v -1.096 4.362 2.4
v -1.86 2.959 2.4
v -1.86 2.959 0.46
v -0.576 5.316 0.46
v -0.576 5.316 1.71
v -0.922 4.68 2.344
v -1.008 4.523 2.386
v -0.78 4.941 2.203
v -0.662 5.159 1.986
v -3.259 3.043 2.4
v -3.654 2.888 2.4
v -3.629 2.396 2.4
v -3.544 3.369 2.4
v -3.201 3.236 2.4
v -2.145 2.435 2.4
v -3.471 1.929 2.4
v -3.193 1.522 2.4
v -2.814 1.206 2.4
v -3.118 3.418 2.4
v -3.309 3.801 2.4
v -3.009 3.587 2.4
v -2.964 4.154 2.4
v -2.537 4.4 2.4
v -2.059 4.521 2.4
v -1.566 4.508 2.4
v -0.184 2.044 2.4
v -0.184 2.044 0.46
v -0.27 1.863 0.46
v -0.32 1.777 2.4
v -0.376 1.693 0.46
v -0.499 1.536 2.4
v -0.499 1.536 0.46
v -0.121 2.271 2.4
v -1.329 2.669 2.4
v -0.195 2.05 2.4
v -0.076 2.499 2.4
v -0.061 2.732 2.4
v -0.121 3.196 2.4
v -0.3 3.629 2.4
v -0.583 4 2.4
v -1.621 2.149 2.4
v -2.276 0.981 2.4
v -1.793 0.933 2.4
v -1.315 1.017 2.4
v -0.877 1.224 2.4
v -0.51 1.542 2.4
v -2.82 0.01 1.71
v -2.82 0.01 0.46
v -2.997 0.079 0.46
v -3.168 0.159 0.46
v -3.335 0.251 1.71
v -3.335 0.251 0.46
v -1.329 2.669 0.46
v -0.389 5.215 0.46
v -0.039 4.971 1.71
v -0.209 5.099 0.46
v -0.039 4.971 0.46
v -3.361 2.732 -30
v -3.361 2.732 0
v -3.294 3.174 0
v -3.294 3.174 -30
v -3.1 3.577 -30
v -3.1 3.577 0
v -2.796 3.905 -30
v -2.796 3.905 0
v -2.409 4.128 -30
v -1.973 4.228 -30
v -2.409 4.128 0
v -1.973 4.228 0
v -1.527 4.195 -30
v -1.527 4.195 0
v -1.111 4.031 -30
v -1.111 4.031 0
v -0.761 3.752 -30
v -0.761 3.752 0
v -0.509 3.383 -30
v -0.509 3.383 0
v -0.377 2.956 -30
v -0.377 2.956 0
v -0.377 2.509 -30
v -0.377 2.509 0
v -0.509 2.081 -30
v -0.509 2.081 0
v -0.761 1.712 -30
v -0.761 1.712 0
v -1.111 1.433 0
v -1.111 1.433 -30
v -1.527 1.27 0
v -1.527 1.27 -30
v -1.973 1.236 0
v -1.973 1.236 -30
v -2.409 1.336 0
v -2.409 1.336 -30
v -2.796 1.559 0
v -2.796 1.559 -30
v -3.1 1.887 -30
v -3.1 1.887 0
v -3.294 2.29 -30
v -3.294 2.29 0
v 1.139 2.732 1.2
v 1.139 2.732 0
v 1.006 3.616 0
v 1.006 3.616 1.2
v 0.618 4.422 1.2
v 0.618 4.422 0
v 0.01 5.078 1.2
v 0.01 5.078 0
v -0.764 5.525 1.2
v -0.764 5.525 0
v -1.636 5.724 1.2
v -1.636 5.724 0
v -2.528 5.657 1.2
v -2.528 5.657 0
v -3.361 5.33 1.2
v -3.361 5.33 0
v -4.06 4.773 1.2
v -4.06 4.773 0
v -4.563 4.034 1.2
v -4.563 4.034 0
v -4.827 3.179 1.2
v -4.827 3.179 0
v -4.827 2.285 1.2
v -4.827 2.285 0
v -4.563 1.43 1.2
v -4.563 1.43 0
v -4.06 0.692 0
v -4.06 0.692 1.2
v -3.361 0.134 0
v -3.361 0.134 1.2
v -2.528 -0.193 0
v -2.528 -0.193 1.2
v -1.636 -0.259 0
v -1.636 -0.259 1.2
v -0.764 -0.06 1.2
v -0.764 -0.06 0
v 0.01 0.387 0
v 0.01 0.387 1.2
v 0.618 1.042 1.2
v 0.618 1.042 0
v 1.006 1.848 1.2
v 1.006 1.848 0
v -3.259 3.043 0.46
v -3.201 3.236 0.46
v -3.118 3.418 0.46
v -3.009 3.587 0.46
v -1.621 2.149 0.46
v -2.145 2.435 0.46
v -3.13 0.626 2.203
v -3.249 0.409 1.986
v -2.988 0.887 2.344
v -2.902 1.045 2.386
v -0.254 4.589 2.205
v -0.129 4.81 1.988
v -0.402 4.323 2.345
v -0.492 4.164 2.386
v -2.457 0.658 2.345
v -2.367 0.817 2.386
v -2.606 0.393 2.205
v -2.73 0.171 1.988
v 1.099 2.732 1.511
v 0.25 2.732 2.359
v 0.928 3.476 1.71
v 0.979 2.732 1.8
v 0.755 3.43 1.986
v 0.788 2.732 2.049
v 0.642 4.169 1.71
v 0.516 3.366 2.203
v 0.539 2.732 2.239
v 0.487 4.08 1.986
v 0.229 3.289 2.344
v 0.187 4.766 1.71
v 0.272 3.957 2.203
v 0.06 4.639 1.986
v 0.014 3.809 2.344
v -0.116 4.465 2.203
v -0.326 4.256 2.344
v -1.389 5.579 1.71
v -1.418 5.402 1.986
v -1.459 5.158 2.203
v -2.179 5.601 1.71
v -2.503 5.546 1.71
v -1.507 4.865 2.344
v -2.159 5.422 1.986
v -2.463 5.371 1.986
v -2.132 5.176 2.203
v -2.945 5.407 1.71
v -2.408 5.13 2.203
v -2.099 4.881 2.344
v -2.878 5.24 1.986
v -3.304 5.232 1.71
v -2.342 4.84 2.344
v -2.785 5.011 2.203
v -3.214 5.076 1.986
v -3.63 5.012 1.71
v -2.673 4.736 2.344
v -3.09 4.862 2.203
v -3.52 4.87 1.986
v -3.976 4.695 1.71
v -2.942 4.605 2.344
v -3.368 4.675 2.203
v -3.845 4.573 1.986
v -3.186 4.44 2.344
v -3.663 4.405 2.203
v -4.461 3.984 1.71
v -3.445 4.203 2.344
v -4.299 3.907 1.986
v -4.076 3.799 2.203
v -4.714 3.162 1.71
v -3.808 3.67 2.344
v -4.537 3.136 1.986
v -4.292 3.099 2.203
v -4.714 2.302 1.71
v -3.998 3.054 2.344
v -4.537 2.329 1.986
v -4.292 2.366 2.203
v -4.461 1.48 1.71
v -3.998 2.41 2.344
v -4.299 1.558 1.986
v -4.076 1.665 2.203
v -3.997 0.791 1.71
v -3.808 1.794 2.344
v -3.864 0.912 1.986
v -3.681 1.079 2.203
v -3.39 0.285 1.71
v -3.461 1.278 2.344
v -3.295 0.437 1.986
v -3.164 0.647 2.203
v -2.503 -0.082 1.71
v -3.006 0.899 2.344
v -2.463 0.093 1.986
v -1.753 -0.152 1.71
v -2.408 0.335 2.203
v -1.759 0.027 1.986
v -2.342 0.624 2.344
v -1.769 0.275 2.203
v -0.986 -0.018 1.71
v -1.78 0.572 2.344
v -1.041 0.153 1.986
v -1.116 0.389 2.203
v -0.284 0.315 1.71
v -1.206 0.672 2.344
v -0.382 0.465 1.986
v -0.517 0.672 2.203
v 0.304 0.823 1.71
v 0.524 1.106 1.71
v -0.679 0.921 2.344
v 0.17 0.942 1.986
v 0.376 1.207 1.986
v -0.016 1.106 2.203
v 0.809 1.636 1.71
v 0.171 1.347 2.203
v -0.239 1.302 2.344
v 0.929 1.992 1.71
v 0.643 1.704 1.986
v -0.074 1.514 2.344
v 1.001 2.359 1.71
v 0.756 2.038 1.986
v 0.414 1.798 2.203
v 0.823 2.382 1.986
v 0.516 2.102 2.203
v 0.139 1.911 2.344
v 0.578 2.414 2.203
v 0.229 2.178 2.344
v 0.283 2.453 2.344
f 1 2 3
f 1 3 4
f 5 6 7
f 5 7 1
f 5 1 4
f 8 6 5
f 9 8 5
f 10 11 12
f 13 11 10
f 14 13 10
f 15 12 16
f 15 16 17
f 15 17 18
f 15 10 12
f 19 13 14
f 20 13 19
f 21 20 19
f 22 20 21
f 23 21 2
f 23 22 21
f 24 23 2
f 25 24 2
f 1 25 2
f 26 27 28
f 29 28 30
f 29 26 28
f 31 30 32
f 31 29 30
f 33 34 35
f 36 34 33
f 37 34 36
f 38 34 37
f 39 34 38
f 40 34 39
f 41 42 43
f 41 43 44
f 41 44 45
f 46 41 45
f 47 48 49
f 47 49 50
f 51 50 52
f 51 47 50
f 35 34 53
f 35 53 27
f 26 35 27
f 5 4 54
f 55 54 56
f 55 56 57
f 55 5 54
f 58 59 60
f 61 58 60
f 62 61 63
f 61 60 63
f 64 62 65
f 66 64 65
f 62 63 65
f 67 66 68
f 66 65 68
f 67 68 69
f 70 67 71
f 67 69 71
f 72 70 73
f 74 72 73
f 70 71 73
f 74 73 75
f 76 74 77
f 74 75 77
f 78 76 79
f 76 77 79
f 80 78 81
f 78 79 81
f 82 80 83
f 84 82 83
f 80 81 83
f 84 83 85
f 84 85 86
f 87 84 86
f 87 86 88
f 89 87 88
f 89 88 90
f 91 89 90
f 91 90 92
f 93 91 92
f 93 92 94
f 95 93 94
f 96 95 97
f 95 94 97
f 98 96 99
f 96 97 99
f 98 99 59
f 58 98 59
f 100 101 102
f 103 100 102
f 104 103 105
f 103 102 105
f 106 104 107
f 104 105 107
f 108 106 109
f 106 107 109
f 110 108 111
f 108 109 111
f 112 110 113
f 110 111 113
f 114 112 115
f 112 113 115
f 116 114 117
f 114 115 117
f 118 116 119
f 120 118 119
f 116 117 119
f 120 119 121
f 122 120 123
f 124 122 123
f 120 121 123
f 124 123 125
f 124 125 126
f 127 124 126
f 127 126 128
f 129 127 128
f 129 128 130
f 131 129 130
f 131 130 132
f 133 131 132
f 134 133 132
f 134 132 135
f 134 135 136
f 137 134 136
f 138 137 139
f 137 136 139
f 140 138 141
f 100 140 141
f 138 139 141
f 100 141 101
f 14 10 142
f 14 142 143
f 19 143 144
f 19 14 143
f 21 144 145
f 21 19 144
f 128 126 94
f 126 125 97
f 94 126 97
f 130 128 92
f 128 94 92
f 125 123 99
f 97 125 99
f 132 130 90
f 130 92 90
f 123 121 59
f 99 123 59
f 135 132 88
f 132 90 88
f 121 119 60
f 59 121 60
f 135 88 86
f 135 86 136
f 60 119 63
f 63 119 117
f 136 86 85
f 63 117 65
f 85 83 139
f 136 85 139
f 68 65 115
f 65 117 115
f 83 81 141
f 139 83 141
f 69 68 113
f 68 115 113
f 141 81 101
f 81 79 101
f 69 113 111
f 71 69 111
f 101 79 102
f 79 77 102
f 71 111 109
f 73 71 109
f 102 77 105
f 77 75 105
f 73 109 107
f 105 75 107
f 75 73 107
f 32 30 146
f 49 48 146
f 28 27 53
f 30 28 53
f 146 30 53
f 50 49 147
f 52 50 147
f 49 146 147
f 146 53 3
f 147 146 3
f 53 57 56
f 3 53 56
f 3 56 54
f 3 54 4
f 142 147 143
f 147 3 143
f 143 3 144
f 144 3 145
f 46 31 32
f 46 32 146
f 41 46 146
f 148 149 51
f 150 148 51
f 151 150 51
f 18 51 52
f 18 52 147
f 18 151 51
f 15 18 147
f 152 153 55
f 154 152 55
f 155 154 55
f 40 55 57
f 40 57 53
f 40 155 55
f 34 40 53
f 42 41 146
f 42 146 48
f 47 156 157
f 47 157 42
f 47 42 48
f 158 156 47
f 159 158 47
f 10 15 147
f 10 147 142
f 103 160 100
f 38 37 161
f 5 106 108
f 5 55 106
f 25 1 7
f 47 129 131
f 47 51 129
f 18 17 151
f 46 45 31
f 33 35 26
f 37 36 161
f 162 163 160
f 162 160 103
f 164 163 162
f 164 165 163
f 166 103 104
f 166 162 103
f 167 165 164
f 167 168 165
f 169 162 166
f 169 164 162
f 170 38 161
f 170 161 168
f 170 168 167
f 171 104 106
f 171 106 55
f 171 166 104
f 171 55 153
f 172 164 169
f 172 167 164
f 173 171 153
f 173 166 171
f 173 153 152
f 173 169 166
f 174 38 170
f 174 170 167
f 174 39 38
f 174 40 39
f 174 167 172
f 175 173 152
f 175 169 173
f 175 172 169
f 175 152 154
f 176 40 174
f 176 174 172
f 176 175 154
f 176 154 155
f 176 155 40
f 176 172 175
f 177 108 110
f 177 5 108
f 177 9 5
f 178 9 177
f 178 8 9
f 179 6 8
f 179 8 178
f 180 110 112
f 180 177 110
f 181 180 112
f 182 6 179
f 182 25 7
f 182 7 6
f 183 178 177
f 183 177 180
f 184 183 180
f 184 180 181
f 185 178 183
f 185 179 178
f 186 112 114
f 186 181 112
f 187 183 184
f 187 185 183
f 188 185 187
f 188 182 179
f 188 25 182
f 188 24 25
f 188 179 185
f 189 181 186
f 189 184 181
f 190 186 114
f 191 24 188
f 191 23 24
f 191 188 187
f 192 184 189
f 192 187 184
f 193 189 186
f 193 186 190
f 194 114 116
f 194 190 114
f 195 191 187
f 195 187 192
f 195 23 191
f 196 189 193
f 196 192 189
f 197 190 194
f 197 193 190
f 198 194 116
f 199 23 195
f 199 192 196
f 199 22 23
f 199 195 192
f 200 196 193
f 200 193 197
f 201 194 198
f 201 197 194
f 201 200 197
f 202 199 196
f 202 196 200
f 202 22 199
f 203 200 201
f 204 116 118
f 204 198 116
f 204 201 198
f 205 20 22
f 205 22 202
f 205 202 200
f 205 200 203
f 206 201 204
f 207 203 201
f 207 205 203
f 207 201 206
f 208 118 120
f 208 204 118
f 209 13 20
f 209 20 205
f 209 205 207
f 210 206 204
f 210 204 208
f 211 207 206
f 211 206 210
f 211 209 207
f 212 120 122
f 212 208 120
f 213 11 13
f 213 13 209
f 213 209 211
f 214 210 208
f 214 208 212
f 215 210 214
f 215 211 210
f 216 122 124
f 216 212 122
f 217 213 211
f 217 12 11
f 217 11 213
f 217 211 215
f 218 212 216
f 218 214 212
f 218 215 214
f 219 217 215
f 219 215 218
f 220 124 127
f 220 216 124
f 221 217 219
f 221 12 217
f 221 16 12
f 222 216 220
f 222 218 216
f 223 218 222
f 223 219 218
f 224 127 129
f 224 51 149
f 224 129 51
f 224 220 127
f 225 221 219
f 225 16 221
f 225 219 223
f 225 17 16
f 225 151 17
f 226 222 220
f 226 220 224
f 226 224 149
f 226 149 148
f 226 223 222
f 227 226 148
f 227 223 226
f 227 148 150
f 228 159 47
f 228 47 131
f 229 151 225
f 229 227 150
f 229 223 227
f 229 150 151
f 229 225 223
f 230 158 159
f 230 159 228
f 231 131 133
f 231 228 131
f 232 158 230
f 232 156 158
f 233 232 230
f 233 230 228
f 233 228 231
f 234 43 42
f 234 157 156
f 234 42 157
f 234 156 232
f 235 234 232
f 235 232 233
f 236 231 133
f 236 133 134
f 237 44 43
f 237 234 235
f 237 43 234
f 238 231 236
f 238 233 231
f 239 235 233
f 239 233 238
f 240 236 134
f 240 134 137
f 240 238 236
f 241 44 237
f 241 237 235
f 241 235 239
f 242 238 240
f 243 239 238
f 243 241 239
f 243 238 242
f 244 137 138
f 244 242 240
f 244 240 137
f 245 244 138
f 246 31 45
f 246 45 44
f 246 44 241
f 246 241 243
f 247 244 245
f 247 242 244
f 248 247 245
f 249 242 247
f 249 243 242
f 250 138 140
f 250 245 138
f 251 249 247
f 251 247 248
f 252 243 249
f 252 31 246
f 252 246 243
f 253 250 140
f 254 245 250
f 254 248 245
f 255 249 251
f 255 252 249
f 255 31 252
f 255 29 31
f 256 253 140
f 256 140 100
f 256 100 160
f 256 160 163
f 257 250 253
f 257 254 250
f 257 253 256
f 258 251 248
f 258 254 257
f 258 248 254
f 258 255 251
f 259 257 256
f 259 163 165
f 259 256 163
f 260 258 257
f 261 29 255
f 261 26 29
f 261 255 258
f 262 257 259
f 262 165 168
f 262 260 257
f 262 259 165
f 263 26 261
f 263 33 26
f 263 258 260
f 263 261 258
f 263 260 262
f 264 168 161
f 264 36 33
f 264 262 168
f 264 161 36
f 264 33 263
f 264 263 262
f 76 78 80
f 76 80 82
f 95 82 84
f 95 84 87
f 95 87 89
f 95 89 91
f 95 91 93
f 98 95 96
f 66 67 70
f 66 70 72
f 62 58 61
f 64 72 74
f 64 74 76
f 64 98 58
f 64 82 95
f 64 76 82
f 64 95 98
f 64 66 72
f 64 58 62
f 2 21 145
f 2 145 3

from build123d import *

# Parameters (mm, degrees)
SZKIC1_R                    = 3
DODANIE_WYCI_GNI_CIE2_DEPTH = 2.4
SZKIC2_R                    = 1.5
DODANIE_WYCI_GNI_CIE3_DEPTH = 30
ZAOKR_GLENIE2_R             = 1.2
WYTNIJ_WYCI_GNI_CIE1_DEPTH  = 1.94


with BuildPart() as part:
    # Szkic1 → Dodanie-wyciągnięcie2 (new body)
    with BuildSketch(Plane.XY):
        with Locations((-1.860516246, 2.732142857)):
            Circle(SZKIC1_R)
    extrude(amount=DODANIE_WYCI_GNI_CIE2_DEPTH)

    # Szkic2 → Dodanie-wyciągnięcie3 (add)
    with BuildSketch(Plane(origin=(0, 0, 0), x_dir=(-1, 0, 0), z_dir=(0, 0, -1))):
        with Locations((1.860516246, 2.732142857)):
            Circle(SZKIC2_R)
    extrude(amount=DODANIE_WYCI_GNI_CIE3_DEPTH)

    # Zaokrąglenie2
    zaokr_glenie2_edges = [part.edges().sort_by_distance(p)[0] for p in [
        (-4.860516246, 2.732142857, 2.4),
    ]]
    fillet(zaokr_glenie2_edges, radius=ZAOKR_GLENIE2_R)

    # Szkic3 → Wytnij-wyciągnięcie1 (cut)
    with BuildSketch(Plane.XY.offset(2.4)):
        with BuildLine():
            Line((-1.859548318, 2.959091853), (-0.575649693, 5.316481314))
            ThreePointArc((-0.575649693, 5.316481314), (-0.297886623, 5.158637444), (-0.039271083, 4.97106076))
            Line((-0.039271083, 4.97106076), (-1.329373025, 2.669425378))
            Line((-1.329373025, 2.669425378), (-0.183967515, 2.043621837))
            ThreePointArc((-0.183967515, 2.043621837), (-0.320475658, 1.776553075), (-0.499159616, 1.535654258))
            Line((-0.499159616, 1.535654258), (-1.621312108, 2.148584891))
            Line((-1.621312108, 2.148584891), (-2.819933608, 0.01015725))
            ThreePointArc((-2.819933608, 0.01015725), (-3.083174674, 0.117799023), (-3.33454353, 0.250826496))
            Line((-3.33454353, 0.250826496), (-2.145142944, 2.434706401))
            Line((-2.145142944, 2.434706401), (-3.258687897, 3.042935511))
            ThreePointArc((-3.258687897, 3.042935511), (-3.162842423, 3.328316127), (-3.009463836, 3.587359481))
            Line((-3.009463836, 3.587359481), (-1.859548318, 2.959091853))
        make_face()
    extrude(amount=-WYTNIJ_WYCI_GNI_CIE1_DEPTH, mode=Mode.SUBTRACT)


solid = part.part
